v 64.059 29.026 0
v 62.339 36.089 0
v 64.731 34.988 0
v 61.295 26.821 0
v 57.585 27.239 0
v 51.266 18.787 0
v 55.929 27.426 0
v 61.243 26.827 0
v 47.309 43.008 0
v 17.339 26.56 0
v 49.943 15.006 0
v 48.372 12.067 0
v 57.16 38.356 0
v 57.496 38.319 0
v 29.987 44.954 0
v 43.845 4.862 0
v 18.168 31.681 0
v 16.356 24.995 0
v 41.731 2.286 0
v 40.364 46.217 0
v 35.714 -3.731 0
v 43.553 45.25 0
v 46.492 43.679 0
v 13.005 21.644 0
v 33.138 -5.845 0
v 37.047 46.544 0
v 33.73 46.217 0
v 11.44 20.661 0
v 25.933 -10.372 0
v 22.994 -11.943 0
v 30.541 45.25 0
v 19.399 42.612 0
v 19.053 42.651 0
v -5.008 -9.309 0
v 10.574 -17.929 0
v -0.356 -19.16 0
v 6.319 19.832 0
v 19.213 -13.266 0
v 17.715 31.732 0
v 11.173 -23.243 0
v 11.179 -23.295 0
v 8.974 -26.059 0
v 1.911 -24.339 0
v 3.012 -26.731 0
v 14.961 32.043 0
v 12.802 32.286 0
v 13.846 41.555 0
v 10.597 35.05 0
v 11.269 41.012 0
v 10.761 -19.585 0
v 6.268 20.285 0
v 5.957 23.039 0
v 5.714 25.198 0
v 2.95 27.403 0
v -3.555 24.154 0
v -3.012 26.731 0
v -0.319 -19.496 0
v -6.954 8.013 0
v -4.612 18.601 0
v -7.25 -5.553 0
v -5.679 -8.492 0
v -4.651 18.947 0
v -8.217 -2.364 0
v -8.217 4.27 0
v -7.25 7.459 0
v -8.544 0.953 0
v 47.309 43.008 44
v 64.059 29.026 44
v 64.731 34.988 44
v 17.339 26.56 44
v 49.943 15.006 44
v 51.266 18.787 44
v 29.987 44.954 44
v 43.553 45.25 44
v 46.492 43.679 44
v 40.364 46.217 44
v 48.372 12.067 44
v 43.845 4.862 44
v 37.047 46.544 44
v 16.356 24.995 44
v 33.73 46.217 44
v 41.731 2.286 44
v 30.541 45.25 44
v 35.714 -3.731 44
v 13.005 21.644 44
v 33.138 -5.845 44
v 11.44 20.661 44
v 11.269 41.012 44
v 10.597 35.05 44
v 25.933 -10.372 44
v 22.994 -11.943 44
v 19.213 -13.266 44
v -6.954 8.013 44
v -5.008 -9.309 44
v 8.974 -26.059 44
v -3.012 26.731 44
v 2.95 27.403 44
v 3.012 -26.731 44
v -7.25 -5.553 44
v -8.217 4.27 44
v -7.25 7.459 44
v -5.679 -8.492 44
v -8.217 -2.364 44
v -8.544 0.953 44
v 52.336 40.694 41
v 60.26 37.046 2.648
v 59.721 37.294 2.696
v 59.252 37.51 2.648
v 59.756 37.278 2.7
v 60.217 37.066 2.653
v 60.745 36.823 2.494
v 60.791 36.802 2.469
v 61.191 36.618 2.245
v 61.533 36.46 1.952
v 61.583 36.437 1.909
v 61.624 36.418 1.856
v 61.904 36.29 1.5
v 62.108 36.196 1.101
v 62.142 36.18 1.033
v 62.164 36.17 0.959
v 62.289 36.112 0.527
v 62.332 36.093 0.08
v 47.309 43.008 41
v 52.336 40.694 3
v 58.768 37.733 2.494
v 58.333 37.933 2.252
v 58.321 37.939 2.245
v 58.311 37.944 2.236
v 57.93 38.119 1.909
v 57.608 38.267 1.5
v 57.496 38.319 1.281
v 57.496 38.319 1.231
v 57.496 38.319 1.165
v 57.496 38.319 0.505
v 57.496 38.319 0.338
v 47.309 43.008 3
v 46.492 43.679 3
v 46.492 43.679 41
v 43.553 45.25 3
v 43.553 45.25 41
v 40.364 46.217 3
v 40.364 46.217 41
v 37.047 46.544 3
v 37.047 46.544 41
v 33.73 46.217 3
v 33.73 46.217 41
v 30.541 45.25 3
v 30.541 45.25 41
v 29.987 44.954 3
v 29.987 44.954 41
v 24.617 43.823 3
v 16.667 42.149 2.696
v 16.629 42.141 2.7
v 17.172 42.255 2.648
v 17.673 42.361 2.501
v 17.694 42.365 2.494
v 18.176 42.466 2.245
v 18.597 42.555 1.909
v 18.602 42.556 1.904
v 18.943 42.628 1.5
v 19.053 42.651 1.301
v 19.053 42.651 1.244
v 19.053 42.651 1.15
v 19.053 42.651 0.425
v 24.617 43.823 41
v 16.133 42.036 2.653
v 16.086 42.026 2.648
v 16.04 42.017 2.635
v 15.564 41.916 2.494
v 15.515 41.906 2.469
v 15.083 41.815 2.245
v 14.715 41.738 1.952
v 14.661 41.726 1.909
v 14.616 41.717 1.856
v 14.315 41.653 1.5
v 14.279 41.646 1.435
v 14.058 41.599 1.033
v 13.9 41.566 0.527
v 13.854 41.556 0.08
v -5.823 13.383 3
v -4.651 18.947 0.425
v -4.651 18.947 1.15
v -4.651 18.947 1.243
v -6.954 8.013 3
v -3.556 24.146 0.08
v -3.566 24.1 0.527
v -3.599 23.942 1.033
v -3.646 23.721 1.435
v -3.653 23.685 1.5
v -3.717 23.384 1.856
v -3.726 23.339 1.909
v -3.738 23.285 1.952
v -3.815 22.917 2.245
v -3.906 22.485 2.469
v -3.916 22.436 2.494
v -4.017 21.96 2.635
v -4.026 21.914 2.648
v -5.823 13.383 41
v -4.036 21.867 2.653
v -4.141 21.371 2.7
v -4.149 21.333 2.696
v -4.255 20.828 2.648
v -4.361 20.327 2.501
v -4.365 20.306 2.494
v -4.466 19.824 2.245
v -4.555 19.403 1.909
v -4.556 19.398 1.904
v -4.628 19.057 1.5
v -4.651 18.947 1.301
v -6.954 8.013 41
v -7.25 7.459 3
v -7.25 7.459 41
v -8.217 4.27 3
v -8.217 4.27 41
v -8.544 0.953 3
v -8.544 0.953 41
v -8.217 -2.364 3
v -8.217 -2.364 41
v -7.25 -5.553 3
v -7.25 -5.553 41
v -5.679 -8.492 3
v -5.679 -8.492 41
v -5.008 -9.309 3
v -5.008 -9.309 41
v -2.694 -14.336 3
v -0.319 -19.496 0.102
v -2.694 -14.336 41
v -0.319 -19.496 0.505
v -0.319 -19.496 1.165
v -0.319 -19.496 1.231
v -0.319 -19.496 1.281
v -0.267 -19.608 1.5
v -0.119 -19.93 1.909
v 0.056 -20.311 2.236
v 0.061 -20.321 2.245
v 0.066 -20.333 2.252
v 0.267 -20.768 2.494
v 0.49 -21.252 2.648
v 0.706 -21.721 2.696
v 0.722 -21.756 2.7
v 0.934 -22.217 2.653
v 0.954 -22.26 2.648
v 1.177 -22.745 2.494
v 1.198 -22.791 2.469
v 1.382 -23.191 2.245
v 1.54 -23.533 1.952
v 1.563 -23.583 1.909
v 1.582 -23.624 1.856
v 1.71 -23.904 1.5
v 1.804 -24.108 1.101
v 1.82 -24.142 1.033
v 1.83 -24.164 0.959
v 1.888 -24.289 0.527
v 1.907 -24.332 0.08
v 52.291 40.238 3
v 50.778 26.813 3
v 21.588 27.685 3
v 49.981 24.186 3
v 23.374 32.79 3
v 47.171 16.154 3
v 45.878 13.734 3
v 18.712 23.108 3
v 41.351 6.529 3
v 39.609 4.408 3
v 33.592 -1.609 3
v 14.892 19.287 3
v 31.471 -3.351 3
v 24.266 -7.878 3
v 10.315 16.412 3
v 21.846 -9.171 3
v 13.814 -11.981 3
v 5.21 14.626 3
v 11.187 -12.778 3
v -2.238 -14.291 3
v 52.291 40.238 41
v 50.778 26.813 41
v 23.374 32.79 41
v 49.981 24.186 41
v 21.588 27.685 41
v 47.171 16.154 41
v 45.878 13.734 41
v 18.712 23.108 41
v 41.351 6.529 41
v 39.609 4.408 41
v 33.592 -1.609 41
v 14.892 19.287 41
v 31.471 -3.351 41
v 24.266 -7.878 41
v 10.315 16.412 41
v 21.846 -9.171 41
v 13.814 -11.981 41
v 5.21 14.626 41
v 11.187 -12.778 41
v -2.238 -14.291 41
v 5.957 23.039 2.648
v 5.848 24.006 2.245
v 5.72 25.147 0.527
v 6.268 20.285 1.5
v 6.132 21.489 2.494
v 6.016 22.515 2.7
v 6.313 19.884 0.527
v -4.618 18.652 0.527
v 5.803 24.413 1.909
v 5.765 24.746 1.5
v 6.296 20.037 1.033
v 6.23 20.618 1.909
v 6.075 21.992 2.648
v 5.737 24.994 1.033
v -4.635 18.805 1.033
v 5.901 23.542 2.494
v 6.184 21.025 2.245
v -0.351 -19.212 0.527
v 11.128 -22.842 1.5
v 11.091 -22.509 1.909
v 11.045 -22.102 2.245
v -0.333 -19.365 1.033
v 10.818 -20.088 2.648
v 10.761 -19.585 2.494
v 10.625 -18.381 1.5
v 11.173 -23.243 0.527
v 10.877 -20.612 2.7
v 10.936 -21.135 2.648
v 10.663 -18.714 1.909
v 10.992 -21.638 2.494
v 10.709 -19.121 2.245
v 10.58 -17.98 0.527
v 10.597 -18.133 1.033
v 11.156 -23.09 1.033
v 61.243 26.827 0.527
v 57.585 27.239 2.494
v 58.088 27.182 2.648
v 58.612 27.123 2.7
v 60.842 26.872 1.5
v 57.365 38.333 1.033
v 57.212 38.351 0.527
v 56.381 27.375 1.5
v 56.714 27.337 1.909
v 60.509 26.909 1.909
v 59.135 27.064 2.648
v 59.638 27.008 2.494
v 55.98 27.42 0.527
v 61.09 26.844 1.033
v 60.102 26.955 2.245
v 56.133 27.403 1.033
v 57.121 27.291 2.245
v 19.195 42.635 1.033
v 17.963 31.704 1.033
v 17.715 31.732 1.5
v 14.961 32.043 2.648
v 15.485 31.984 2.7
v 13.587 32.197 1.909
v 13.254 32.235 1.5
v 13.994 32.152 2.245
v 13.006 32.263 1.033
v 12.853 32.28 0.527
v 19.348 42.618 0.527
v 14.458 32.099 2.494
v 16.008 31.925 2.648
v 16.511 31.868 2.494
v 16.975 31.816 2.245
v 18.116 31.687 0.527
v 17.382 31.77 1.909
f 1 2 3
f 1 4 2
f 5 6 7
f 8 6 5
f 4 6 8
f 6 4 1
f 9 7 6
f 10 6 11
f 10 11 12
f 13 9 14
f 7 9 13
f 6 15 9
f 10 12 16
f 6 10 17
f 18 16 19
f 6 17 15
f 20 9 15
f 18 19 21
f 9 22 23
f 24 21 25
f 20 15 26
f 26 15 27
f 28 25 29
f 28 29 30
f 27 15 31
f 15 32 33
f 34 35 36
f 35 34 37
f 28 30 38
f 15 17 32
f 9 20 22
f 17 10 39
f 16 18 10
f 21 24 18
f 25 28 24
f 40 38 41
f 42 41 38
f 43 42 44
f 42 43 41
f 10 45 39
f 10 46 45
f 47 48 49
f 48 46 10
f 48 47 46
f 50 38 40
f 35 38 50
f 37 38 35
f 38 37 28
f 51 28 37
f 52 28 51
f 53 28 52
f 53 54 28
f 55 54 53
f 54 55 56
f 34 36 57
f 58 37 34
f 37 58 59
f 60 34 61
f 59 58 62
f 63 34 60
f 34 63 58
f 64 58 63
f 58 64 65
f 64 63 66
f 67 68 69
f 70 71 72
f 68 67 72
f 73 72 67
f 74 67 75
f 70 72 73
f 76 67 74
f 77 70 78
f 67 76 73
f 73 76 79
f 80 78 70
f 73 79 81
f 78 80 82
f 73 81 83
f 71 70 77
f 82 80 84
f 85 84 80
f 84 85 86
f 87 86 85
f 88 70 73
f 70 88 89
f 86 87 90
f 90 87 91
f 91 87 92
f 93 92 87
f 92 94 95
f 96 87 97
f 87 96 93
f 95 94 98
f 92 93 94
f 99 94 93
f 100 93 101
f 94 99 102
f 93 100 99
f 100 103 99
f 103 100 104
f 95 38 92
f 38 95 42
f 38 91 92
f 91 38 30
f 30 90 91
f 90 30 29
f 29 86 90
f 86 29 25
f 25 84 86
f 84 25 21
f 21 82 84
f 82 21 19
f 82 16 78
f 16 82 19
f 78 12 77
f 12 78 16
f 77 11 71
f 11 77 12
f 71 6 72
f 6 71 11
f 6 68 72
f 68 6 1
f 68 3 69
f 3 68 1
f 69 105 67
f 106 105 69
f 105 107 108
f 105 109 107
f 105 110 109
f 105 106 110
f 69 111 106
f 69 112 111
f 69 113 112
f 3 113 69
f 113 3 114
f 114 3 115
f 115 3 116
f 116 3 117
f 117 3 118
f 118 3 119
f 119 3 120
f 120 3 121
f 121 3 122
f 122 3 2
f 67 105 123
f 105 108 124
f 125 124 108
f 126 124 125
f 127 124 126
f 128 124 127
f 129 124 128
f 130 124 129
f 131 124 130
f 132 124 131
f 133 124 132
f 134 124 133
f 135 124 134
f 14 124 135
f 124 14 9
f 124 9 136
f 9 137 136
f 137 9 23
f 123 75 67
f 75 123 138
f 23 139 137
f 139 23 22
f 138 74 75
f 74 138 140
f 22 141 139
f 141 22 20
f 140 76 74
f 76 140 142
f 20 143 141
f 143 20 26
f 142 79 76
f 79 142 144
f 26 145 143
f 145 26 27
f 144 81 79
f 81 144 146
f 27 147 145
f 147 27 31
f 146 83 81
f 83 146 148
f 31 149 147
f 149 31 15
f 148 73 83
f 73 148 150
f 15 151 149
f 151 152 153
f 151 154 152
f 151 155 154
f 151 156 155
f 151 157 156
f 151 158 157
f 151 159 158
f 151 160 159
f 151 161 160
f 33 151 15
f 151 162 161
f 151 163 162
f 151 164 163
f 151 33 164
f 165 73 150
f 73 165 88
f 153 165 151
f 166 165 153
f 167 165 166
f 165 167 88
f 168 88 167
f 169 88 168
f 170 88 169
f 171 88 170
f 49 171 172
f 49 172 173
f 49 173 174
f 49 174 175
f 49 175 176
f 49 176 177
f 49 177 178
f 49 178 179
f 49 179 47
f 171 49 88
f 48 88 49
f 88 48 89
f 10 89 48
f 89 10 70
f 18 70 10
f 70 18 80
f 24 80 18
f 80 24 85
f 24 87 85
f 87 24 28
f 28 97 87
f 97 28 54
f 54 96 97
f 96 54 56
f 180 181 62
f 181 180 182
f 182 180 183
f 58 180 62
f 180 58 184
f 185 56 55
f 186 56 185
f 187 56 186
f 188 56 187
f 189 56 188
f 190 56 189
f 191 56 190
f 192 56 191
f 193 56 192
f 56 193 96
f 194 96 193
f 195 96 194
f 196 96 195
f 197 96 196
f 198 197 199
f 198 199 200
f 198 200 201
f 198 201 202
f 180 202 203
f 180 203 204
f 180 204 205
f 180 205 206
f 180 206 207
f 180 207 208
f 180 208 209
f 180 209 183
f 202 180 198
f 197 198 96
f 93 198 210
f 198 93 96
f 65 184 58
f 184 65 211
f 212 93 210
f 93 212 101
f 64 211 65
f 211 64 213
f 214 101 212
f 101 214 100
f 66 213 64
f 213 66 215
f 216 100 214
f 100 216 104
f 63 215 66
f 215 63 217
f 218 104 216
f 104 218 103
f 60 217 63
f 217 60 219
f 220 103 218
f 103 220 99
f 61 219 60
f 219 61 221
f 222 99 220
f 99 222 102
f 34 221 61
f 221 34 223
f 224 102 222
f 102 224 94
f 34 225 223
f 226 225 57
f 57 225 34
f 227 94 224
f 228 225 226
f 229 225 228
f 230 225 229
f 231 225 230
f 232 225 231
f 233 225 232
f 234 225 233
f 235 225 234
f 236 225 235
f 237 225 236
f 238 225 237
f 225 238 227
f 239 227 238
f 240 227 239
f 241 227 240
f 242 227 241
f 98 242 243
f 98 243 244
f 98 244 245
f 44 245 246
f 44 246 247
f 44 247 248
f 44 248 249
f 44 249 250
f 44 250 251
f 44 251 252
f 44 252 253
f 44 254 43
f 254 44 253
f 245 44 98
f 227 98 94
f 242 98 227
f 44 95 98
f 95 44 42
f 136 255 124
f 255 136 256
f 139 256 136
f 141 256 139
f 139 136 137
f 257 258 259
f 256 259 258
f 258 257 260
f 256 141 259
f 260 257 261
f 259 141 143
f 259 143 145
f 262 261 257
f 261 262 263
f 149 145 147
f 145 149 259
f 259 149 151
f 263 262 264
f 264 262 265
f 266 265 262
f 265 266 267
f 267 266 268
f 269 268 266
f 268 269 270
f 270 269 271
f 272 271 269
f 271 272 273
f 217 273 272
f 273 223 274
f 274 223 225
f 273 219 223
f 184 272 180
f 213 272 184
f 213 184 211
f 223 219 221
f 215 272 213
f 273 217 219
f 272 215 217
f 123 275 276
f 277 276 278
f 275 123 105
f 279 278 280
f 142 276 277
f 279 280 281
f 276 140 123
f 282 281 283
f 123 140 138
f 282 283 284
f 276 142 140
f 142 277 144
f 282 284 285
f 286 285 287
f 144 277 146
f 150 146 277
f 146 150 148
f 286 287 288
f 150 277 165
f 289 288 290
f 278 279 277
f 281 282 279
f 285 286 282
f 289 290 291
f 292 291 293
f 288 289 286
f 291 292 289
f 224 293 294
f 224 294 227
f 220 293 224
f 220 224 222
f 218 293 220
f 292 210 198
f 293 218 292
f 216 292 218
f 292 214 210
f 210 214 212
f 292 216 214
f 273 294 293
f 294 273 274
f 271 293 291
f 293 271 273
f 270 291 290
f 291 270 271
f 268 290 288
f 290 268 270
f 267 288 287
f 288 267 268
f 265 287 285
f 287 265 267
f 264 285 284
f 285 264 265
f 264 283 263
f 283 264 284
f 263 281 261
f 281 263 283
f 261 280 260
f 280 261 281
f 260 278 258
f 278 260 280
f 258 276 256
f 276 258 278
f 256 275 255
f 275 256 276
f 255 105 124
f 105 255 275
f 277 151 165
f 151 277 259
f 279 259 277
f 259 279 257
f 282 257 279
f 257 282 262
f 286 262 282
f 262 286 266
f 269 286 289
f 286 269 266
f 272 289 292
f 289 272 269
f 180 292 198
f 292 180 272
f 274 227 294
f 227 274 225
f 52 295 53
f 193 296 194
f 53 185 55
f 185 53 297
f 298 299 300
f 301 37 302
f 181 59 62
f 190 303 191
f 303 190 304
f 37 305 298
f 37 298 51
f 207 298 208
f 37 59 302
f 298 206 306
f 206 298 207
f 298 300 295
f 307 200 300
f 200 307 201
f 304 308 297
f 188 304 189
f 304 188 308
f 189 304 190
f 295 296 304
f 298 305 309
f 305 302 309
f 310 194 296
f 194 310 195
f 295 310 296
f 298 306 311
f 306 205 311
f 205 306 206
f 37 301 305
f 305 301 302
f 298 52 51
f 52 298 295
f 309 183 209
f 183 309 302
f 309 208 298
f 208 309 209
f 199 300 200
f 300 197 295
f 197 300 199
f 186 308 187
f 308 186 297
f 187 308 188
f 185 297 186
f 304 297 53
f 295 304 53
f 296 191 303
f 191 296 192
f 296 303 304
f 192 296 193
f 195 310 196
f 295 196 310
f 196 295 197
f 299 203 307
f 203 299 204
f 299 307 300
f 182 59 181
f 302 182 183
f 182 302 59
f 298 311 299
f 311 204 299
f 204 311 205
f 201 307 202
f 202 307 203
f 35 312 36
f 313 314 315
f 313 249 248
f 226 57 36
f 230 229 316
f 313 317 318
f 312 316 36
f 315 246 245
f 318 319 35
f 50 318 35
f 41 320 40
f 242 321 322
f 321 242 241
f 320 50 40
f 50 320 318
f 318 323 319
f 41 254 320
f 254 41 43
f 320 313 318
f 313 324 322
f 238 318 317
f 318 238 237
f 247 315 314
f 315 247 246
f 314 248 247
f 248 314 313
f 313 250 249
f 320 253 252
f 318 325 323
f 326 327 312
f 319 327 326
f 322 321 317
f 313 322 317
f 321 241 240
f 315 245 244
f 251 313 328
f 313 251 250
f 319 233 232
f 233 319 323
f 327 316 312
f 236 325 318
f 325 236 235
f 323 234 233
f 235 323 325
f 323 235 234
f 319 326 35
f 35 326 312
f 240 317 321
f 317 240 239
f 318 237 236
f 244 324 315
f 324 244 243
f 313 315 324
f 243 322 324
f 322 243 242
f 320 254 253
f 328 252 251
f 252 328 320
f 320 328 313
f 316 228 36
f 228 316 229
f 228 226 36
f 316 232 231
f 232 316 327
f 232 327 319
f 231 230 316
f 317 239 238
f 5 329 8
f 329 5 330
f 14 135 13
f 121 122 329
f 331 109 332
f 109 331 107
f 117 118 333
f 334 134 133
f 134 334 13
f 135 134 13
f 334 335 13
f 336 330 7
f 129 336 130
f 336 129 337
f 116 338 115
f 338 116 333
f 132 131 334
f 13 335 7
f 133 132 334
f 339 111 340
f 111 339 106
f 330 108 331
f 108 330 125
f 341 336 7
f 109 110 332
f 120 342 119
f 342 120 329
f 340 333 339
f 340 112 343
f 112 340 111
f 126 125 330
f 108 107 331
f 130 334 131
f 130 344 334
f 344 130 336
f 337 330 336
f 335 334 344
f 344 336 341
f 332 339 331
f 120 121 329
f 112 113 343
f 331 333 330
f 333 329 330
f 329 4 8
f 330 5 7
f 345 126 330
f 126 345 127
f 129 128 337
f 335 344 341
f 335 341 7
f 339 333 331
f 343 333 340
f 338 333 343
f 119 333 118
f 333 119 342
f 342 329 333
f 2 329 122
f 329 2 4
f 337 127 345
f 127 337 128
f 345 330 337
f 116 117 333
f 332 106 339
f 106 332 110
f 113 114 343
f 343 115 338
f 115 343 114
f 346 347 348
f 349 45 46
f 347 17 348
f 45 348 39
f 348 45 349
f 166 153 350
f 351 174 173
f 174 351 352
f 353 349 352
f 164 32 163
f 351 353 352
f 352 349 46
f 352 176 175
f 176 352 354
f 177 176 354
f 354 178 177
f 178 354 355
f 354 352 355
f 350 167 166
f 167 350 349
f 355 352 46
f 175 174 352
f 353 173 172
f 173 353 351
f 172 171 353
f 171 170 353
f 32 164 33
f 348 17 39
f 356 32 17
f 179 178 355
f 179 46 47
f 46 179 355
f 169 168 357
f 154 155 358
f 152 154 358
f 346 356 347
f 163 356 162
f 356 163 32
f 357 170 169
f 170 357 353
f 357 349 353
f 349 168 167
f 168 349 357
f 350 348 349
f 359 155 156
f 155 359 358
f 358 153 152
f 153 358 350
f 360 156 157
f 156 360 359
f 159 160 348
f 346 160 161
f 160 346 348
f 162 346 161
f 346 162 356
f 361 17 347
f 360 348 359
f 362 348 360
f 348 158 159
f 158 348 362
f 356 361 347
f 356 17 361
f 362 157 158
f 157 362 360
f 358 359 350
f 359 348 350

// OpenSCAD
$fn = 32;

// ----------------------------------------------------------------------
// Air duct: 34 mm duct, 3 mm wall, 44 mm across
// ----------------------------------------------------------------------

// --- parameters (mm) ---
duct_r = 17;              // duct core radius
duct_d = 34;              // duct core diameter
wall = 3;                 // duct wall thickness
height = 44;              // duct width (extrusion height)
port_r = 26.9;            // port flange half width
port_d = 53.8;            // port flange width
port_t = 6;               // port flange thickness
bolt_d = 5.4;             // port bolt holes
bolt_offset = 21.7;       // bolt hole offset from the port axis

difference() {
  /* outer hull chain: tube with a flat flange plate at every port */
  linear_extrude(height = 44) {
    hull() {
      polygon([[3.012, -26.731], [-3.012, 26.731], [2.95, 27.403], [8.974, -26.059]]);
      translate([8.943, 1.008]) circle(r = 17);
    }
    hull() {
      translate([8.943, 1.008]) circle(r = 17);
      translate([8.456, 0.953]) circle(r = 17);
    }
    hull() {
      translate([8.456, 0.953]) circle(r = 17);
      translate([16.488, 3.763]) circle(r = 17);
    }
    hull() {
      translate([16.488, 3.763]) circle(r = 17);
      translate([23.693, 8.29]) circle(r = 17);
    }
    hull() {
      translate([23.693, 8.29]) circle(r = 17);
      translate([29.71, 14.307]) circle(r = 17);
    }
    hull() {
      translate([29.71, 14.307]) circle(r = 17);
      translate([34.237, 21.512]) circle(r = 17);
    }
    hull() {
      translate([34.237, 21.512]) circle(r = 17);
      translate([37.047, 29.544]) circle(r = 17);
    }
    hull() {
      translate([37.047, 29.544]) circle(r = 17);
      translate([36.992, 29.057]) circle(r = 17);
    }
    hull() {
      translate([36.992, 29.057]) circle(r = 17);
      polygon([[11.269, 41.012], [64.731, 34.988], [64.059, 29.026], [10.597, 35.05]]);
    }
  }
  /* air passage: the same chain inset by the wall, 5 mm proud of the ports */
  translate([0, 0, 3]) linear_extrude(height = 38) {
    hull() {
      translate([-4.969, -0.56]) circle(r = 14);
      translate([8.456, 0.953]) circle(r = 14);
    }
    hull() {
      translate([8.456, 0.953]) circle(r = 14);
      translate([16.488, 3.763]) circle(r = 14);
    }
    hull() {
      translate([16.488, 3.763]) circle(r = 14);
      translate([23.693, 8.29]) circle(r = 14);
    }
    hull() {
      translate([23.693, 8.29]) circle(r = 14);
      translate([29.71, 14.307]) circle(r = 14);
    }
    hull() {
      translate([29.71, 14.307]) circle(r = 14);
      translate([34.237, 21.512]) circle(r = 14);
    }
    hull() {
      translate([34.237, 21.512]) circle(r = 14);
      translate([37.047, 29.544]) circle(r = 14);
    }
    hull() {
      translate([37.047, 29.544]) circle(r = 14);
      translate([38.56, 42.969]) circle(r = 14);
    }
  }
  translate([0, 0]) rotate([0, 0, -83.57]) translate([-21.7, -2.5]) rotate([-90, 0, 0]) cylinder(h = 11, d = 5.4);
  translate([0, 0]) rotate([0, 0, -83.57]) translate([21.7, -2.5]) rotate([-90, 0, 0]) cylinder(h = 11, d = 5.4);
  translate([38, 38]) rotate([0, 0, 173.57]) translate([-21.7, -2.5]) rotate([-90, 0, 0]) cylinder(h = 11, d = 5.4);
  translate([38, 38]) rotate([0, 0, 173.57]) translate([21.7, -2.5]) rotate([-90, 0, 0]) cylinder(h = 11, d = 5.4);
}
